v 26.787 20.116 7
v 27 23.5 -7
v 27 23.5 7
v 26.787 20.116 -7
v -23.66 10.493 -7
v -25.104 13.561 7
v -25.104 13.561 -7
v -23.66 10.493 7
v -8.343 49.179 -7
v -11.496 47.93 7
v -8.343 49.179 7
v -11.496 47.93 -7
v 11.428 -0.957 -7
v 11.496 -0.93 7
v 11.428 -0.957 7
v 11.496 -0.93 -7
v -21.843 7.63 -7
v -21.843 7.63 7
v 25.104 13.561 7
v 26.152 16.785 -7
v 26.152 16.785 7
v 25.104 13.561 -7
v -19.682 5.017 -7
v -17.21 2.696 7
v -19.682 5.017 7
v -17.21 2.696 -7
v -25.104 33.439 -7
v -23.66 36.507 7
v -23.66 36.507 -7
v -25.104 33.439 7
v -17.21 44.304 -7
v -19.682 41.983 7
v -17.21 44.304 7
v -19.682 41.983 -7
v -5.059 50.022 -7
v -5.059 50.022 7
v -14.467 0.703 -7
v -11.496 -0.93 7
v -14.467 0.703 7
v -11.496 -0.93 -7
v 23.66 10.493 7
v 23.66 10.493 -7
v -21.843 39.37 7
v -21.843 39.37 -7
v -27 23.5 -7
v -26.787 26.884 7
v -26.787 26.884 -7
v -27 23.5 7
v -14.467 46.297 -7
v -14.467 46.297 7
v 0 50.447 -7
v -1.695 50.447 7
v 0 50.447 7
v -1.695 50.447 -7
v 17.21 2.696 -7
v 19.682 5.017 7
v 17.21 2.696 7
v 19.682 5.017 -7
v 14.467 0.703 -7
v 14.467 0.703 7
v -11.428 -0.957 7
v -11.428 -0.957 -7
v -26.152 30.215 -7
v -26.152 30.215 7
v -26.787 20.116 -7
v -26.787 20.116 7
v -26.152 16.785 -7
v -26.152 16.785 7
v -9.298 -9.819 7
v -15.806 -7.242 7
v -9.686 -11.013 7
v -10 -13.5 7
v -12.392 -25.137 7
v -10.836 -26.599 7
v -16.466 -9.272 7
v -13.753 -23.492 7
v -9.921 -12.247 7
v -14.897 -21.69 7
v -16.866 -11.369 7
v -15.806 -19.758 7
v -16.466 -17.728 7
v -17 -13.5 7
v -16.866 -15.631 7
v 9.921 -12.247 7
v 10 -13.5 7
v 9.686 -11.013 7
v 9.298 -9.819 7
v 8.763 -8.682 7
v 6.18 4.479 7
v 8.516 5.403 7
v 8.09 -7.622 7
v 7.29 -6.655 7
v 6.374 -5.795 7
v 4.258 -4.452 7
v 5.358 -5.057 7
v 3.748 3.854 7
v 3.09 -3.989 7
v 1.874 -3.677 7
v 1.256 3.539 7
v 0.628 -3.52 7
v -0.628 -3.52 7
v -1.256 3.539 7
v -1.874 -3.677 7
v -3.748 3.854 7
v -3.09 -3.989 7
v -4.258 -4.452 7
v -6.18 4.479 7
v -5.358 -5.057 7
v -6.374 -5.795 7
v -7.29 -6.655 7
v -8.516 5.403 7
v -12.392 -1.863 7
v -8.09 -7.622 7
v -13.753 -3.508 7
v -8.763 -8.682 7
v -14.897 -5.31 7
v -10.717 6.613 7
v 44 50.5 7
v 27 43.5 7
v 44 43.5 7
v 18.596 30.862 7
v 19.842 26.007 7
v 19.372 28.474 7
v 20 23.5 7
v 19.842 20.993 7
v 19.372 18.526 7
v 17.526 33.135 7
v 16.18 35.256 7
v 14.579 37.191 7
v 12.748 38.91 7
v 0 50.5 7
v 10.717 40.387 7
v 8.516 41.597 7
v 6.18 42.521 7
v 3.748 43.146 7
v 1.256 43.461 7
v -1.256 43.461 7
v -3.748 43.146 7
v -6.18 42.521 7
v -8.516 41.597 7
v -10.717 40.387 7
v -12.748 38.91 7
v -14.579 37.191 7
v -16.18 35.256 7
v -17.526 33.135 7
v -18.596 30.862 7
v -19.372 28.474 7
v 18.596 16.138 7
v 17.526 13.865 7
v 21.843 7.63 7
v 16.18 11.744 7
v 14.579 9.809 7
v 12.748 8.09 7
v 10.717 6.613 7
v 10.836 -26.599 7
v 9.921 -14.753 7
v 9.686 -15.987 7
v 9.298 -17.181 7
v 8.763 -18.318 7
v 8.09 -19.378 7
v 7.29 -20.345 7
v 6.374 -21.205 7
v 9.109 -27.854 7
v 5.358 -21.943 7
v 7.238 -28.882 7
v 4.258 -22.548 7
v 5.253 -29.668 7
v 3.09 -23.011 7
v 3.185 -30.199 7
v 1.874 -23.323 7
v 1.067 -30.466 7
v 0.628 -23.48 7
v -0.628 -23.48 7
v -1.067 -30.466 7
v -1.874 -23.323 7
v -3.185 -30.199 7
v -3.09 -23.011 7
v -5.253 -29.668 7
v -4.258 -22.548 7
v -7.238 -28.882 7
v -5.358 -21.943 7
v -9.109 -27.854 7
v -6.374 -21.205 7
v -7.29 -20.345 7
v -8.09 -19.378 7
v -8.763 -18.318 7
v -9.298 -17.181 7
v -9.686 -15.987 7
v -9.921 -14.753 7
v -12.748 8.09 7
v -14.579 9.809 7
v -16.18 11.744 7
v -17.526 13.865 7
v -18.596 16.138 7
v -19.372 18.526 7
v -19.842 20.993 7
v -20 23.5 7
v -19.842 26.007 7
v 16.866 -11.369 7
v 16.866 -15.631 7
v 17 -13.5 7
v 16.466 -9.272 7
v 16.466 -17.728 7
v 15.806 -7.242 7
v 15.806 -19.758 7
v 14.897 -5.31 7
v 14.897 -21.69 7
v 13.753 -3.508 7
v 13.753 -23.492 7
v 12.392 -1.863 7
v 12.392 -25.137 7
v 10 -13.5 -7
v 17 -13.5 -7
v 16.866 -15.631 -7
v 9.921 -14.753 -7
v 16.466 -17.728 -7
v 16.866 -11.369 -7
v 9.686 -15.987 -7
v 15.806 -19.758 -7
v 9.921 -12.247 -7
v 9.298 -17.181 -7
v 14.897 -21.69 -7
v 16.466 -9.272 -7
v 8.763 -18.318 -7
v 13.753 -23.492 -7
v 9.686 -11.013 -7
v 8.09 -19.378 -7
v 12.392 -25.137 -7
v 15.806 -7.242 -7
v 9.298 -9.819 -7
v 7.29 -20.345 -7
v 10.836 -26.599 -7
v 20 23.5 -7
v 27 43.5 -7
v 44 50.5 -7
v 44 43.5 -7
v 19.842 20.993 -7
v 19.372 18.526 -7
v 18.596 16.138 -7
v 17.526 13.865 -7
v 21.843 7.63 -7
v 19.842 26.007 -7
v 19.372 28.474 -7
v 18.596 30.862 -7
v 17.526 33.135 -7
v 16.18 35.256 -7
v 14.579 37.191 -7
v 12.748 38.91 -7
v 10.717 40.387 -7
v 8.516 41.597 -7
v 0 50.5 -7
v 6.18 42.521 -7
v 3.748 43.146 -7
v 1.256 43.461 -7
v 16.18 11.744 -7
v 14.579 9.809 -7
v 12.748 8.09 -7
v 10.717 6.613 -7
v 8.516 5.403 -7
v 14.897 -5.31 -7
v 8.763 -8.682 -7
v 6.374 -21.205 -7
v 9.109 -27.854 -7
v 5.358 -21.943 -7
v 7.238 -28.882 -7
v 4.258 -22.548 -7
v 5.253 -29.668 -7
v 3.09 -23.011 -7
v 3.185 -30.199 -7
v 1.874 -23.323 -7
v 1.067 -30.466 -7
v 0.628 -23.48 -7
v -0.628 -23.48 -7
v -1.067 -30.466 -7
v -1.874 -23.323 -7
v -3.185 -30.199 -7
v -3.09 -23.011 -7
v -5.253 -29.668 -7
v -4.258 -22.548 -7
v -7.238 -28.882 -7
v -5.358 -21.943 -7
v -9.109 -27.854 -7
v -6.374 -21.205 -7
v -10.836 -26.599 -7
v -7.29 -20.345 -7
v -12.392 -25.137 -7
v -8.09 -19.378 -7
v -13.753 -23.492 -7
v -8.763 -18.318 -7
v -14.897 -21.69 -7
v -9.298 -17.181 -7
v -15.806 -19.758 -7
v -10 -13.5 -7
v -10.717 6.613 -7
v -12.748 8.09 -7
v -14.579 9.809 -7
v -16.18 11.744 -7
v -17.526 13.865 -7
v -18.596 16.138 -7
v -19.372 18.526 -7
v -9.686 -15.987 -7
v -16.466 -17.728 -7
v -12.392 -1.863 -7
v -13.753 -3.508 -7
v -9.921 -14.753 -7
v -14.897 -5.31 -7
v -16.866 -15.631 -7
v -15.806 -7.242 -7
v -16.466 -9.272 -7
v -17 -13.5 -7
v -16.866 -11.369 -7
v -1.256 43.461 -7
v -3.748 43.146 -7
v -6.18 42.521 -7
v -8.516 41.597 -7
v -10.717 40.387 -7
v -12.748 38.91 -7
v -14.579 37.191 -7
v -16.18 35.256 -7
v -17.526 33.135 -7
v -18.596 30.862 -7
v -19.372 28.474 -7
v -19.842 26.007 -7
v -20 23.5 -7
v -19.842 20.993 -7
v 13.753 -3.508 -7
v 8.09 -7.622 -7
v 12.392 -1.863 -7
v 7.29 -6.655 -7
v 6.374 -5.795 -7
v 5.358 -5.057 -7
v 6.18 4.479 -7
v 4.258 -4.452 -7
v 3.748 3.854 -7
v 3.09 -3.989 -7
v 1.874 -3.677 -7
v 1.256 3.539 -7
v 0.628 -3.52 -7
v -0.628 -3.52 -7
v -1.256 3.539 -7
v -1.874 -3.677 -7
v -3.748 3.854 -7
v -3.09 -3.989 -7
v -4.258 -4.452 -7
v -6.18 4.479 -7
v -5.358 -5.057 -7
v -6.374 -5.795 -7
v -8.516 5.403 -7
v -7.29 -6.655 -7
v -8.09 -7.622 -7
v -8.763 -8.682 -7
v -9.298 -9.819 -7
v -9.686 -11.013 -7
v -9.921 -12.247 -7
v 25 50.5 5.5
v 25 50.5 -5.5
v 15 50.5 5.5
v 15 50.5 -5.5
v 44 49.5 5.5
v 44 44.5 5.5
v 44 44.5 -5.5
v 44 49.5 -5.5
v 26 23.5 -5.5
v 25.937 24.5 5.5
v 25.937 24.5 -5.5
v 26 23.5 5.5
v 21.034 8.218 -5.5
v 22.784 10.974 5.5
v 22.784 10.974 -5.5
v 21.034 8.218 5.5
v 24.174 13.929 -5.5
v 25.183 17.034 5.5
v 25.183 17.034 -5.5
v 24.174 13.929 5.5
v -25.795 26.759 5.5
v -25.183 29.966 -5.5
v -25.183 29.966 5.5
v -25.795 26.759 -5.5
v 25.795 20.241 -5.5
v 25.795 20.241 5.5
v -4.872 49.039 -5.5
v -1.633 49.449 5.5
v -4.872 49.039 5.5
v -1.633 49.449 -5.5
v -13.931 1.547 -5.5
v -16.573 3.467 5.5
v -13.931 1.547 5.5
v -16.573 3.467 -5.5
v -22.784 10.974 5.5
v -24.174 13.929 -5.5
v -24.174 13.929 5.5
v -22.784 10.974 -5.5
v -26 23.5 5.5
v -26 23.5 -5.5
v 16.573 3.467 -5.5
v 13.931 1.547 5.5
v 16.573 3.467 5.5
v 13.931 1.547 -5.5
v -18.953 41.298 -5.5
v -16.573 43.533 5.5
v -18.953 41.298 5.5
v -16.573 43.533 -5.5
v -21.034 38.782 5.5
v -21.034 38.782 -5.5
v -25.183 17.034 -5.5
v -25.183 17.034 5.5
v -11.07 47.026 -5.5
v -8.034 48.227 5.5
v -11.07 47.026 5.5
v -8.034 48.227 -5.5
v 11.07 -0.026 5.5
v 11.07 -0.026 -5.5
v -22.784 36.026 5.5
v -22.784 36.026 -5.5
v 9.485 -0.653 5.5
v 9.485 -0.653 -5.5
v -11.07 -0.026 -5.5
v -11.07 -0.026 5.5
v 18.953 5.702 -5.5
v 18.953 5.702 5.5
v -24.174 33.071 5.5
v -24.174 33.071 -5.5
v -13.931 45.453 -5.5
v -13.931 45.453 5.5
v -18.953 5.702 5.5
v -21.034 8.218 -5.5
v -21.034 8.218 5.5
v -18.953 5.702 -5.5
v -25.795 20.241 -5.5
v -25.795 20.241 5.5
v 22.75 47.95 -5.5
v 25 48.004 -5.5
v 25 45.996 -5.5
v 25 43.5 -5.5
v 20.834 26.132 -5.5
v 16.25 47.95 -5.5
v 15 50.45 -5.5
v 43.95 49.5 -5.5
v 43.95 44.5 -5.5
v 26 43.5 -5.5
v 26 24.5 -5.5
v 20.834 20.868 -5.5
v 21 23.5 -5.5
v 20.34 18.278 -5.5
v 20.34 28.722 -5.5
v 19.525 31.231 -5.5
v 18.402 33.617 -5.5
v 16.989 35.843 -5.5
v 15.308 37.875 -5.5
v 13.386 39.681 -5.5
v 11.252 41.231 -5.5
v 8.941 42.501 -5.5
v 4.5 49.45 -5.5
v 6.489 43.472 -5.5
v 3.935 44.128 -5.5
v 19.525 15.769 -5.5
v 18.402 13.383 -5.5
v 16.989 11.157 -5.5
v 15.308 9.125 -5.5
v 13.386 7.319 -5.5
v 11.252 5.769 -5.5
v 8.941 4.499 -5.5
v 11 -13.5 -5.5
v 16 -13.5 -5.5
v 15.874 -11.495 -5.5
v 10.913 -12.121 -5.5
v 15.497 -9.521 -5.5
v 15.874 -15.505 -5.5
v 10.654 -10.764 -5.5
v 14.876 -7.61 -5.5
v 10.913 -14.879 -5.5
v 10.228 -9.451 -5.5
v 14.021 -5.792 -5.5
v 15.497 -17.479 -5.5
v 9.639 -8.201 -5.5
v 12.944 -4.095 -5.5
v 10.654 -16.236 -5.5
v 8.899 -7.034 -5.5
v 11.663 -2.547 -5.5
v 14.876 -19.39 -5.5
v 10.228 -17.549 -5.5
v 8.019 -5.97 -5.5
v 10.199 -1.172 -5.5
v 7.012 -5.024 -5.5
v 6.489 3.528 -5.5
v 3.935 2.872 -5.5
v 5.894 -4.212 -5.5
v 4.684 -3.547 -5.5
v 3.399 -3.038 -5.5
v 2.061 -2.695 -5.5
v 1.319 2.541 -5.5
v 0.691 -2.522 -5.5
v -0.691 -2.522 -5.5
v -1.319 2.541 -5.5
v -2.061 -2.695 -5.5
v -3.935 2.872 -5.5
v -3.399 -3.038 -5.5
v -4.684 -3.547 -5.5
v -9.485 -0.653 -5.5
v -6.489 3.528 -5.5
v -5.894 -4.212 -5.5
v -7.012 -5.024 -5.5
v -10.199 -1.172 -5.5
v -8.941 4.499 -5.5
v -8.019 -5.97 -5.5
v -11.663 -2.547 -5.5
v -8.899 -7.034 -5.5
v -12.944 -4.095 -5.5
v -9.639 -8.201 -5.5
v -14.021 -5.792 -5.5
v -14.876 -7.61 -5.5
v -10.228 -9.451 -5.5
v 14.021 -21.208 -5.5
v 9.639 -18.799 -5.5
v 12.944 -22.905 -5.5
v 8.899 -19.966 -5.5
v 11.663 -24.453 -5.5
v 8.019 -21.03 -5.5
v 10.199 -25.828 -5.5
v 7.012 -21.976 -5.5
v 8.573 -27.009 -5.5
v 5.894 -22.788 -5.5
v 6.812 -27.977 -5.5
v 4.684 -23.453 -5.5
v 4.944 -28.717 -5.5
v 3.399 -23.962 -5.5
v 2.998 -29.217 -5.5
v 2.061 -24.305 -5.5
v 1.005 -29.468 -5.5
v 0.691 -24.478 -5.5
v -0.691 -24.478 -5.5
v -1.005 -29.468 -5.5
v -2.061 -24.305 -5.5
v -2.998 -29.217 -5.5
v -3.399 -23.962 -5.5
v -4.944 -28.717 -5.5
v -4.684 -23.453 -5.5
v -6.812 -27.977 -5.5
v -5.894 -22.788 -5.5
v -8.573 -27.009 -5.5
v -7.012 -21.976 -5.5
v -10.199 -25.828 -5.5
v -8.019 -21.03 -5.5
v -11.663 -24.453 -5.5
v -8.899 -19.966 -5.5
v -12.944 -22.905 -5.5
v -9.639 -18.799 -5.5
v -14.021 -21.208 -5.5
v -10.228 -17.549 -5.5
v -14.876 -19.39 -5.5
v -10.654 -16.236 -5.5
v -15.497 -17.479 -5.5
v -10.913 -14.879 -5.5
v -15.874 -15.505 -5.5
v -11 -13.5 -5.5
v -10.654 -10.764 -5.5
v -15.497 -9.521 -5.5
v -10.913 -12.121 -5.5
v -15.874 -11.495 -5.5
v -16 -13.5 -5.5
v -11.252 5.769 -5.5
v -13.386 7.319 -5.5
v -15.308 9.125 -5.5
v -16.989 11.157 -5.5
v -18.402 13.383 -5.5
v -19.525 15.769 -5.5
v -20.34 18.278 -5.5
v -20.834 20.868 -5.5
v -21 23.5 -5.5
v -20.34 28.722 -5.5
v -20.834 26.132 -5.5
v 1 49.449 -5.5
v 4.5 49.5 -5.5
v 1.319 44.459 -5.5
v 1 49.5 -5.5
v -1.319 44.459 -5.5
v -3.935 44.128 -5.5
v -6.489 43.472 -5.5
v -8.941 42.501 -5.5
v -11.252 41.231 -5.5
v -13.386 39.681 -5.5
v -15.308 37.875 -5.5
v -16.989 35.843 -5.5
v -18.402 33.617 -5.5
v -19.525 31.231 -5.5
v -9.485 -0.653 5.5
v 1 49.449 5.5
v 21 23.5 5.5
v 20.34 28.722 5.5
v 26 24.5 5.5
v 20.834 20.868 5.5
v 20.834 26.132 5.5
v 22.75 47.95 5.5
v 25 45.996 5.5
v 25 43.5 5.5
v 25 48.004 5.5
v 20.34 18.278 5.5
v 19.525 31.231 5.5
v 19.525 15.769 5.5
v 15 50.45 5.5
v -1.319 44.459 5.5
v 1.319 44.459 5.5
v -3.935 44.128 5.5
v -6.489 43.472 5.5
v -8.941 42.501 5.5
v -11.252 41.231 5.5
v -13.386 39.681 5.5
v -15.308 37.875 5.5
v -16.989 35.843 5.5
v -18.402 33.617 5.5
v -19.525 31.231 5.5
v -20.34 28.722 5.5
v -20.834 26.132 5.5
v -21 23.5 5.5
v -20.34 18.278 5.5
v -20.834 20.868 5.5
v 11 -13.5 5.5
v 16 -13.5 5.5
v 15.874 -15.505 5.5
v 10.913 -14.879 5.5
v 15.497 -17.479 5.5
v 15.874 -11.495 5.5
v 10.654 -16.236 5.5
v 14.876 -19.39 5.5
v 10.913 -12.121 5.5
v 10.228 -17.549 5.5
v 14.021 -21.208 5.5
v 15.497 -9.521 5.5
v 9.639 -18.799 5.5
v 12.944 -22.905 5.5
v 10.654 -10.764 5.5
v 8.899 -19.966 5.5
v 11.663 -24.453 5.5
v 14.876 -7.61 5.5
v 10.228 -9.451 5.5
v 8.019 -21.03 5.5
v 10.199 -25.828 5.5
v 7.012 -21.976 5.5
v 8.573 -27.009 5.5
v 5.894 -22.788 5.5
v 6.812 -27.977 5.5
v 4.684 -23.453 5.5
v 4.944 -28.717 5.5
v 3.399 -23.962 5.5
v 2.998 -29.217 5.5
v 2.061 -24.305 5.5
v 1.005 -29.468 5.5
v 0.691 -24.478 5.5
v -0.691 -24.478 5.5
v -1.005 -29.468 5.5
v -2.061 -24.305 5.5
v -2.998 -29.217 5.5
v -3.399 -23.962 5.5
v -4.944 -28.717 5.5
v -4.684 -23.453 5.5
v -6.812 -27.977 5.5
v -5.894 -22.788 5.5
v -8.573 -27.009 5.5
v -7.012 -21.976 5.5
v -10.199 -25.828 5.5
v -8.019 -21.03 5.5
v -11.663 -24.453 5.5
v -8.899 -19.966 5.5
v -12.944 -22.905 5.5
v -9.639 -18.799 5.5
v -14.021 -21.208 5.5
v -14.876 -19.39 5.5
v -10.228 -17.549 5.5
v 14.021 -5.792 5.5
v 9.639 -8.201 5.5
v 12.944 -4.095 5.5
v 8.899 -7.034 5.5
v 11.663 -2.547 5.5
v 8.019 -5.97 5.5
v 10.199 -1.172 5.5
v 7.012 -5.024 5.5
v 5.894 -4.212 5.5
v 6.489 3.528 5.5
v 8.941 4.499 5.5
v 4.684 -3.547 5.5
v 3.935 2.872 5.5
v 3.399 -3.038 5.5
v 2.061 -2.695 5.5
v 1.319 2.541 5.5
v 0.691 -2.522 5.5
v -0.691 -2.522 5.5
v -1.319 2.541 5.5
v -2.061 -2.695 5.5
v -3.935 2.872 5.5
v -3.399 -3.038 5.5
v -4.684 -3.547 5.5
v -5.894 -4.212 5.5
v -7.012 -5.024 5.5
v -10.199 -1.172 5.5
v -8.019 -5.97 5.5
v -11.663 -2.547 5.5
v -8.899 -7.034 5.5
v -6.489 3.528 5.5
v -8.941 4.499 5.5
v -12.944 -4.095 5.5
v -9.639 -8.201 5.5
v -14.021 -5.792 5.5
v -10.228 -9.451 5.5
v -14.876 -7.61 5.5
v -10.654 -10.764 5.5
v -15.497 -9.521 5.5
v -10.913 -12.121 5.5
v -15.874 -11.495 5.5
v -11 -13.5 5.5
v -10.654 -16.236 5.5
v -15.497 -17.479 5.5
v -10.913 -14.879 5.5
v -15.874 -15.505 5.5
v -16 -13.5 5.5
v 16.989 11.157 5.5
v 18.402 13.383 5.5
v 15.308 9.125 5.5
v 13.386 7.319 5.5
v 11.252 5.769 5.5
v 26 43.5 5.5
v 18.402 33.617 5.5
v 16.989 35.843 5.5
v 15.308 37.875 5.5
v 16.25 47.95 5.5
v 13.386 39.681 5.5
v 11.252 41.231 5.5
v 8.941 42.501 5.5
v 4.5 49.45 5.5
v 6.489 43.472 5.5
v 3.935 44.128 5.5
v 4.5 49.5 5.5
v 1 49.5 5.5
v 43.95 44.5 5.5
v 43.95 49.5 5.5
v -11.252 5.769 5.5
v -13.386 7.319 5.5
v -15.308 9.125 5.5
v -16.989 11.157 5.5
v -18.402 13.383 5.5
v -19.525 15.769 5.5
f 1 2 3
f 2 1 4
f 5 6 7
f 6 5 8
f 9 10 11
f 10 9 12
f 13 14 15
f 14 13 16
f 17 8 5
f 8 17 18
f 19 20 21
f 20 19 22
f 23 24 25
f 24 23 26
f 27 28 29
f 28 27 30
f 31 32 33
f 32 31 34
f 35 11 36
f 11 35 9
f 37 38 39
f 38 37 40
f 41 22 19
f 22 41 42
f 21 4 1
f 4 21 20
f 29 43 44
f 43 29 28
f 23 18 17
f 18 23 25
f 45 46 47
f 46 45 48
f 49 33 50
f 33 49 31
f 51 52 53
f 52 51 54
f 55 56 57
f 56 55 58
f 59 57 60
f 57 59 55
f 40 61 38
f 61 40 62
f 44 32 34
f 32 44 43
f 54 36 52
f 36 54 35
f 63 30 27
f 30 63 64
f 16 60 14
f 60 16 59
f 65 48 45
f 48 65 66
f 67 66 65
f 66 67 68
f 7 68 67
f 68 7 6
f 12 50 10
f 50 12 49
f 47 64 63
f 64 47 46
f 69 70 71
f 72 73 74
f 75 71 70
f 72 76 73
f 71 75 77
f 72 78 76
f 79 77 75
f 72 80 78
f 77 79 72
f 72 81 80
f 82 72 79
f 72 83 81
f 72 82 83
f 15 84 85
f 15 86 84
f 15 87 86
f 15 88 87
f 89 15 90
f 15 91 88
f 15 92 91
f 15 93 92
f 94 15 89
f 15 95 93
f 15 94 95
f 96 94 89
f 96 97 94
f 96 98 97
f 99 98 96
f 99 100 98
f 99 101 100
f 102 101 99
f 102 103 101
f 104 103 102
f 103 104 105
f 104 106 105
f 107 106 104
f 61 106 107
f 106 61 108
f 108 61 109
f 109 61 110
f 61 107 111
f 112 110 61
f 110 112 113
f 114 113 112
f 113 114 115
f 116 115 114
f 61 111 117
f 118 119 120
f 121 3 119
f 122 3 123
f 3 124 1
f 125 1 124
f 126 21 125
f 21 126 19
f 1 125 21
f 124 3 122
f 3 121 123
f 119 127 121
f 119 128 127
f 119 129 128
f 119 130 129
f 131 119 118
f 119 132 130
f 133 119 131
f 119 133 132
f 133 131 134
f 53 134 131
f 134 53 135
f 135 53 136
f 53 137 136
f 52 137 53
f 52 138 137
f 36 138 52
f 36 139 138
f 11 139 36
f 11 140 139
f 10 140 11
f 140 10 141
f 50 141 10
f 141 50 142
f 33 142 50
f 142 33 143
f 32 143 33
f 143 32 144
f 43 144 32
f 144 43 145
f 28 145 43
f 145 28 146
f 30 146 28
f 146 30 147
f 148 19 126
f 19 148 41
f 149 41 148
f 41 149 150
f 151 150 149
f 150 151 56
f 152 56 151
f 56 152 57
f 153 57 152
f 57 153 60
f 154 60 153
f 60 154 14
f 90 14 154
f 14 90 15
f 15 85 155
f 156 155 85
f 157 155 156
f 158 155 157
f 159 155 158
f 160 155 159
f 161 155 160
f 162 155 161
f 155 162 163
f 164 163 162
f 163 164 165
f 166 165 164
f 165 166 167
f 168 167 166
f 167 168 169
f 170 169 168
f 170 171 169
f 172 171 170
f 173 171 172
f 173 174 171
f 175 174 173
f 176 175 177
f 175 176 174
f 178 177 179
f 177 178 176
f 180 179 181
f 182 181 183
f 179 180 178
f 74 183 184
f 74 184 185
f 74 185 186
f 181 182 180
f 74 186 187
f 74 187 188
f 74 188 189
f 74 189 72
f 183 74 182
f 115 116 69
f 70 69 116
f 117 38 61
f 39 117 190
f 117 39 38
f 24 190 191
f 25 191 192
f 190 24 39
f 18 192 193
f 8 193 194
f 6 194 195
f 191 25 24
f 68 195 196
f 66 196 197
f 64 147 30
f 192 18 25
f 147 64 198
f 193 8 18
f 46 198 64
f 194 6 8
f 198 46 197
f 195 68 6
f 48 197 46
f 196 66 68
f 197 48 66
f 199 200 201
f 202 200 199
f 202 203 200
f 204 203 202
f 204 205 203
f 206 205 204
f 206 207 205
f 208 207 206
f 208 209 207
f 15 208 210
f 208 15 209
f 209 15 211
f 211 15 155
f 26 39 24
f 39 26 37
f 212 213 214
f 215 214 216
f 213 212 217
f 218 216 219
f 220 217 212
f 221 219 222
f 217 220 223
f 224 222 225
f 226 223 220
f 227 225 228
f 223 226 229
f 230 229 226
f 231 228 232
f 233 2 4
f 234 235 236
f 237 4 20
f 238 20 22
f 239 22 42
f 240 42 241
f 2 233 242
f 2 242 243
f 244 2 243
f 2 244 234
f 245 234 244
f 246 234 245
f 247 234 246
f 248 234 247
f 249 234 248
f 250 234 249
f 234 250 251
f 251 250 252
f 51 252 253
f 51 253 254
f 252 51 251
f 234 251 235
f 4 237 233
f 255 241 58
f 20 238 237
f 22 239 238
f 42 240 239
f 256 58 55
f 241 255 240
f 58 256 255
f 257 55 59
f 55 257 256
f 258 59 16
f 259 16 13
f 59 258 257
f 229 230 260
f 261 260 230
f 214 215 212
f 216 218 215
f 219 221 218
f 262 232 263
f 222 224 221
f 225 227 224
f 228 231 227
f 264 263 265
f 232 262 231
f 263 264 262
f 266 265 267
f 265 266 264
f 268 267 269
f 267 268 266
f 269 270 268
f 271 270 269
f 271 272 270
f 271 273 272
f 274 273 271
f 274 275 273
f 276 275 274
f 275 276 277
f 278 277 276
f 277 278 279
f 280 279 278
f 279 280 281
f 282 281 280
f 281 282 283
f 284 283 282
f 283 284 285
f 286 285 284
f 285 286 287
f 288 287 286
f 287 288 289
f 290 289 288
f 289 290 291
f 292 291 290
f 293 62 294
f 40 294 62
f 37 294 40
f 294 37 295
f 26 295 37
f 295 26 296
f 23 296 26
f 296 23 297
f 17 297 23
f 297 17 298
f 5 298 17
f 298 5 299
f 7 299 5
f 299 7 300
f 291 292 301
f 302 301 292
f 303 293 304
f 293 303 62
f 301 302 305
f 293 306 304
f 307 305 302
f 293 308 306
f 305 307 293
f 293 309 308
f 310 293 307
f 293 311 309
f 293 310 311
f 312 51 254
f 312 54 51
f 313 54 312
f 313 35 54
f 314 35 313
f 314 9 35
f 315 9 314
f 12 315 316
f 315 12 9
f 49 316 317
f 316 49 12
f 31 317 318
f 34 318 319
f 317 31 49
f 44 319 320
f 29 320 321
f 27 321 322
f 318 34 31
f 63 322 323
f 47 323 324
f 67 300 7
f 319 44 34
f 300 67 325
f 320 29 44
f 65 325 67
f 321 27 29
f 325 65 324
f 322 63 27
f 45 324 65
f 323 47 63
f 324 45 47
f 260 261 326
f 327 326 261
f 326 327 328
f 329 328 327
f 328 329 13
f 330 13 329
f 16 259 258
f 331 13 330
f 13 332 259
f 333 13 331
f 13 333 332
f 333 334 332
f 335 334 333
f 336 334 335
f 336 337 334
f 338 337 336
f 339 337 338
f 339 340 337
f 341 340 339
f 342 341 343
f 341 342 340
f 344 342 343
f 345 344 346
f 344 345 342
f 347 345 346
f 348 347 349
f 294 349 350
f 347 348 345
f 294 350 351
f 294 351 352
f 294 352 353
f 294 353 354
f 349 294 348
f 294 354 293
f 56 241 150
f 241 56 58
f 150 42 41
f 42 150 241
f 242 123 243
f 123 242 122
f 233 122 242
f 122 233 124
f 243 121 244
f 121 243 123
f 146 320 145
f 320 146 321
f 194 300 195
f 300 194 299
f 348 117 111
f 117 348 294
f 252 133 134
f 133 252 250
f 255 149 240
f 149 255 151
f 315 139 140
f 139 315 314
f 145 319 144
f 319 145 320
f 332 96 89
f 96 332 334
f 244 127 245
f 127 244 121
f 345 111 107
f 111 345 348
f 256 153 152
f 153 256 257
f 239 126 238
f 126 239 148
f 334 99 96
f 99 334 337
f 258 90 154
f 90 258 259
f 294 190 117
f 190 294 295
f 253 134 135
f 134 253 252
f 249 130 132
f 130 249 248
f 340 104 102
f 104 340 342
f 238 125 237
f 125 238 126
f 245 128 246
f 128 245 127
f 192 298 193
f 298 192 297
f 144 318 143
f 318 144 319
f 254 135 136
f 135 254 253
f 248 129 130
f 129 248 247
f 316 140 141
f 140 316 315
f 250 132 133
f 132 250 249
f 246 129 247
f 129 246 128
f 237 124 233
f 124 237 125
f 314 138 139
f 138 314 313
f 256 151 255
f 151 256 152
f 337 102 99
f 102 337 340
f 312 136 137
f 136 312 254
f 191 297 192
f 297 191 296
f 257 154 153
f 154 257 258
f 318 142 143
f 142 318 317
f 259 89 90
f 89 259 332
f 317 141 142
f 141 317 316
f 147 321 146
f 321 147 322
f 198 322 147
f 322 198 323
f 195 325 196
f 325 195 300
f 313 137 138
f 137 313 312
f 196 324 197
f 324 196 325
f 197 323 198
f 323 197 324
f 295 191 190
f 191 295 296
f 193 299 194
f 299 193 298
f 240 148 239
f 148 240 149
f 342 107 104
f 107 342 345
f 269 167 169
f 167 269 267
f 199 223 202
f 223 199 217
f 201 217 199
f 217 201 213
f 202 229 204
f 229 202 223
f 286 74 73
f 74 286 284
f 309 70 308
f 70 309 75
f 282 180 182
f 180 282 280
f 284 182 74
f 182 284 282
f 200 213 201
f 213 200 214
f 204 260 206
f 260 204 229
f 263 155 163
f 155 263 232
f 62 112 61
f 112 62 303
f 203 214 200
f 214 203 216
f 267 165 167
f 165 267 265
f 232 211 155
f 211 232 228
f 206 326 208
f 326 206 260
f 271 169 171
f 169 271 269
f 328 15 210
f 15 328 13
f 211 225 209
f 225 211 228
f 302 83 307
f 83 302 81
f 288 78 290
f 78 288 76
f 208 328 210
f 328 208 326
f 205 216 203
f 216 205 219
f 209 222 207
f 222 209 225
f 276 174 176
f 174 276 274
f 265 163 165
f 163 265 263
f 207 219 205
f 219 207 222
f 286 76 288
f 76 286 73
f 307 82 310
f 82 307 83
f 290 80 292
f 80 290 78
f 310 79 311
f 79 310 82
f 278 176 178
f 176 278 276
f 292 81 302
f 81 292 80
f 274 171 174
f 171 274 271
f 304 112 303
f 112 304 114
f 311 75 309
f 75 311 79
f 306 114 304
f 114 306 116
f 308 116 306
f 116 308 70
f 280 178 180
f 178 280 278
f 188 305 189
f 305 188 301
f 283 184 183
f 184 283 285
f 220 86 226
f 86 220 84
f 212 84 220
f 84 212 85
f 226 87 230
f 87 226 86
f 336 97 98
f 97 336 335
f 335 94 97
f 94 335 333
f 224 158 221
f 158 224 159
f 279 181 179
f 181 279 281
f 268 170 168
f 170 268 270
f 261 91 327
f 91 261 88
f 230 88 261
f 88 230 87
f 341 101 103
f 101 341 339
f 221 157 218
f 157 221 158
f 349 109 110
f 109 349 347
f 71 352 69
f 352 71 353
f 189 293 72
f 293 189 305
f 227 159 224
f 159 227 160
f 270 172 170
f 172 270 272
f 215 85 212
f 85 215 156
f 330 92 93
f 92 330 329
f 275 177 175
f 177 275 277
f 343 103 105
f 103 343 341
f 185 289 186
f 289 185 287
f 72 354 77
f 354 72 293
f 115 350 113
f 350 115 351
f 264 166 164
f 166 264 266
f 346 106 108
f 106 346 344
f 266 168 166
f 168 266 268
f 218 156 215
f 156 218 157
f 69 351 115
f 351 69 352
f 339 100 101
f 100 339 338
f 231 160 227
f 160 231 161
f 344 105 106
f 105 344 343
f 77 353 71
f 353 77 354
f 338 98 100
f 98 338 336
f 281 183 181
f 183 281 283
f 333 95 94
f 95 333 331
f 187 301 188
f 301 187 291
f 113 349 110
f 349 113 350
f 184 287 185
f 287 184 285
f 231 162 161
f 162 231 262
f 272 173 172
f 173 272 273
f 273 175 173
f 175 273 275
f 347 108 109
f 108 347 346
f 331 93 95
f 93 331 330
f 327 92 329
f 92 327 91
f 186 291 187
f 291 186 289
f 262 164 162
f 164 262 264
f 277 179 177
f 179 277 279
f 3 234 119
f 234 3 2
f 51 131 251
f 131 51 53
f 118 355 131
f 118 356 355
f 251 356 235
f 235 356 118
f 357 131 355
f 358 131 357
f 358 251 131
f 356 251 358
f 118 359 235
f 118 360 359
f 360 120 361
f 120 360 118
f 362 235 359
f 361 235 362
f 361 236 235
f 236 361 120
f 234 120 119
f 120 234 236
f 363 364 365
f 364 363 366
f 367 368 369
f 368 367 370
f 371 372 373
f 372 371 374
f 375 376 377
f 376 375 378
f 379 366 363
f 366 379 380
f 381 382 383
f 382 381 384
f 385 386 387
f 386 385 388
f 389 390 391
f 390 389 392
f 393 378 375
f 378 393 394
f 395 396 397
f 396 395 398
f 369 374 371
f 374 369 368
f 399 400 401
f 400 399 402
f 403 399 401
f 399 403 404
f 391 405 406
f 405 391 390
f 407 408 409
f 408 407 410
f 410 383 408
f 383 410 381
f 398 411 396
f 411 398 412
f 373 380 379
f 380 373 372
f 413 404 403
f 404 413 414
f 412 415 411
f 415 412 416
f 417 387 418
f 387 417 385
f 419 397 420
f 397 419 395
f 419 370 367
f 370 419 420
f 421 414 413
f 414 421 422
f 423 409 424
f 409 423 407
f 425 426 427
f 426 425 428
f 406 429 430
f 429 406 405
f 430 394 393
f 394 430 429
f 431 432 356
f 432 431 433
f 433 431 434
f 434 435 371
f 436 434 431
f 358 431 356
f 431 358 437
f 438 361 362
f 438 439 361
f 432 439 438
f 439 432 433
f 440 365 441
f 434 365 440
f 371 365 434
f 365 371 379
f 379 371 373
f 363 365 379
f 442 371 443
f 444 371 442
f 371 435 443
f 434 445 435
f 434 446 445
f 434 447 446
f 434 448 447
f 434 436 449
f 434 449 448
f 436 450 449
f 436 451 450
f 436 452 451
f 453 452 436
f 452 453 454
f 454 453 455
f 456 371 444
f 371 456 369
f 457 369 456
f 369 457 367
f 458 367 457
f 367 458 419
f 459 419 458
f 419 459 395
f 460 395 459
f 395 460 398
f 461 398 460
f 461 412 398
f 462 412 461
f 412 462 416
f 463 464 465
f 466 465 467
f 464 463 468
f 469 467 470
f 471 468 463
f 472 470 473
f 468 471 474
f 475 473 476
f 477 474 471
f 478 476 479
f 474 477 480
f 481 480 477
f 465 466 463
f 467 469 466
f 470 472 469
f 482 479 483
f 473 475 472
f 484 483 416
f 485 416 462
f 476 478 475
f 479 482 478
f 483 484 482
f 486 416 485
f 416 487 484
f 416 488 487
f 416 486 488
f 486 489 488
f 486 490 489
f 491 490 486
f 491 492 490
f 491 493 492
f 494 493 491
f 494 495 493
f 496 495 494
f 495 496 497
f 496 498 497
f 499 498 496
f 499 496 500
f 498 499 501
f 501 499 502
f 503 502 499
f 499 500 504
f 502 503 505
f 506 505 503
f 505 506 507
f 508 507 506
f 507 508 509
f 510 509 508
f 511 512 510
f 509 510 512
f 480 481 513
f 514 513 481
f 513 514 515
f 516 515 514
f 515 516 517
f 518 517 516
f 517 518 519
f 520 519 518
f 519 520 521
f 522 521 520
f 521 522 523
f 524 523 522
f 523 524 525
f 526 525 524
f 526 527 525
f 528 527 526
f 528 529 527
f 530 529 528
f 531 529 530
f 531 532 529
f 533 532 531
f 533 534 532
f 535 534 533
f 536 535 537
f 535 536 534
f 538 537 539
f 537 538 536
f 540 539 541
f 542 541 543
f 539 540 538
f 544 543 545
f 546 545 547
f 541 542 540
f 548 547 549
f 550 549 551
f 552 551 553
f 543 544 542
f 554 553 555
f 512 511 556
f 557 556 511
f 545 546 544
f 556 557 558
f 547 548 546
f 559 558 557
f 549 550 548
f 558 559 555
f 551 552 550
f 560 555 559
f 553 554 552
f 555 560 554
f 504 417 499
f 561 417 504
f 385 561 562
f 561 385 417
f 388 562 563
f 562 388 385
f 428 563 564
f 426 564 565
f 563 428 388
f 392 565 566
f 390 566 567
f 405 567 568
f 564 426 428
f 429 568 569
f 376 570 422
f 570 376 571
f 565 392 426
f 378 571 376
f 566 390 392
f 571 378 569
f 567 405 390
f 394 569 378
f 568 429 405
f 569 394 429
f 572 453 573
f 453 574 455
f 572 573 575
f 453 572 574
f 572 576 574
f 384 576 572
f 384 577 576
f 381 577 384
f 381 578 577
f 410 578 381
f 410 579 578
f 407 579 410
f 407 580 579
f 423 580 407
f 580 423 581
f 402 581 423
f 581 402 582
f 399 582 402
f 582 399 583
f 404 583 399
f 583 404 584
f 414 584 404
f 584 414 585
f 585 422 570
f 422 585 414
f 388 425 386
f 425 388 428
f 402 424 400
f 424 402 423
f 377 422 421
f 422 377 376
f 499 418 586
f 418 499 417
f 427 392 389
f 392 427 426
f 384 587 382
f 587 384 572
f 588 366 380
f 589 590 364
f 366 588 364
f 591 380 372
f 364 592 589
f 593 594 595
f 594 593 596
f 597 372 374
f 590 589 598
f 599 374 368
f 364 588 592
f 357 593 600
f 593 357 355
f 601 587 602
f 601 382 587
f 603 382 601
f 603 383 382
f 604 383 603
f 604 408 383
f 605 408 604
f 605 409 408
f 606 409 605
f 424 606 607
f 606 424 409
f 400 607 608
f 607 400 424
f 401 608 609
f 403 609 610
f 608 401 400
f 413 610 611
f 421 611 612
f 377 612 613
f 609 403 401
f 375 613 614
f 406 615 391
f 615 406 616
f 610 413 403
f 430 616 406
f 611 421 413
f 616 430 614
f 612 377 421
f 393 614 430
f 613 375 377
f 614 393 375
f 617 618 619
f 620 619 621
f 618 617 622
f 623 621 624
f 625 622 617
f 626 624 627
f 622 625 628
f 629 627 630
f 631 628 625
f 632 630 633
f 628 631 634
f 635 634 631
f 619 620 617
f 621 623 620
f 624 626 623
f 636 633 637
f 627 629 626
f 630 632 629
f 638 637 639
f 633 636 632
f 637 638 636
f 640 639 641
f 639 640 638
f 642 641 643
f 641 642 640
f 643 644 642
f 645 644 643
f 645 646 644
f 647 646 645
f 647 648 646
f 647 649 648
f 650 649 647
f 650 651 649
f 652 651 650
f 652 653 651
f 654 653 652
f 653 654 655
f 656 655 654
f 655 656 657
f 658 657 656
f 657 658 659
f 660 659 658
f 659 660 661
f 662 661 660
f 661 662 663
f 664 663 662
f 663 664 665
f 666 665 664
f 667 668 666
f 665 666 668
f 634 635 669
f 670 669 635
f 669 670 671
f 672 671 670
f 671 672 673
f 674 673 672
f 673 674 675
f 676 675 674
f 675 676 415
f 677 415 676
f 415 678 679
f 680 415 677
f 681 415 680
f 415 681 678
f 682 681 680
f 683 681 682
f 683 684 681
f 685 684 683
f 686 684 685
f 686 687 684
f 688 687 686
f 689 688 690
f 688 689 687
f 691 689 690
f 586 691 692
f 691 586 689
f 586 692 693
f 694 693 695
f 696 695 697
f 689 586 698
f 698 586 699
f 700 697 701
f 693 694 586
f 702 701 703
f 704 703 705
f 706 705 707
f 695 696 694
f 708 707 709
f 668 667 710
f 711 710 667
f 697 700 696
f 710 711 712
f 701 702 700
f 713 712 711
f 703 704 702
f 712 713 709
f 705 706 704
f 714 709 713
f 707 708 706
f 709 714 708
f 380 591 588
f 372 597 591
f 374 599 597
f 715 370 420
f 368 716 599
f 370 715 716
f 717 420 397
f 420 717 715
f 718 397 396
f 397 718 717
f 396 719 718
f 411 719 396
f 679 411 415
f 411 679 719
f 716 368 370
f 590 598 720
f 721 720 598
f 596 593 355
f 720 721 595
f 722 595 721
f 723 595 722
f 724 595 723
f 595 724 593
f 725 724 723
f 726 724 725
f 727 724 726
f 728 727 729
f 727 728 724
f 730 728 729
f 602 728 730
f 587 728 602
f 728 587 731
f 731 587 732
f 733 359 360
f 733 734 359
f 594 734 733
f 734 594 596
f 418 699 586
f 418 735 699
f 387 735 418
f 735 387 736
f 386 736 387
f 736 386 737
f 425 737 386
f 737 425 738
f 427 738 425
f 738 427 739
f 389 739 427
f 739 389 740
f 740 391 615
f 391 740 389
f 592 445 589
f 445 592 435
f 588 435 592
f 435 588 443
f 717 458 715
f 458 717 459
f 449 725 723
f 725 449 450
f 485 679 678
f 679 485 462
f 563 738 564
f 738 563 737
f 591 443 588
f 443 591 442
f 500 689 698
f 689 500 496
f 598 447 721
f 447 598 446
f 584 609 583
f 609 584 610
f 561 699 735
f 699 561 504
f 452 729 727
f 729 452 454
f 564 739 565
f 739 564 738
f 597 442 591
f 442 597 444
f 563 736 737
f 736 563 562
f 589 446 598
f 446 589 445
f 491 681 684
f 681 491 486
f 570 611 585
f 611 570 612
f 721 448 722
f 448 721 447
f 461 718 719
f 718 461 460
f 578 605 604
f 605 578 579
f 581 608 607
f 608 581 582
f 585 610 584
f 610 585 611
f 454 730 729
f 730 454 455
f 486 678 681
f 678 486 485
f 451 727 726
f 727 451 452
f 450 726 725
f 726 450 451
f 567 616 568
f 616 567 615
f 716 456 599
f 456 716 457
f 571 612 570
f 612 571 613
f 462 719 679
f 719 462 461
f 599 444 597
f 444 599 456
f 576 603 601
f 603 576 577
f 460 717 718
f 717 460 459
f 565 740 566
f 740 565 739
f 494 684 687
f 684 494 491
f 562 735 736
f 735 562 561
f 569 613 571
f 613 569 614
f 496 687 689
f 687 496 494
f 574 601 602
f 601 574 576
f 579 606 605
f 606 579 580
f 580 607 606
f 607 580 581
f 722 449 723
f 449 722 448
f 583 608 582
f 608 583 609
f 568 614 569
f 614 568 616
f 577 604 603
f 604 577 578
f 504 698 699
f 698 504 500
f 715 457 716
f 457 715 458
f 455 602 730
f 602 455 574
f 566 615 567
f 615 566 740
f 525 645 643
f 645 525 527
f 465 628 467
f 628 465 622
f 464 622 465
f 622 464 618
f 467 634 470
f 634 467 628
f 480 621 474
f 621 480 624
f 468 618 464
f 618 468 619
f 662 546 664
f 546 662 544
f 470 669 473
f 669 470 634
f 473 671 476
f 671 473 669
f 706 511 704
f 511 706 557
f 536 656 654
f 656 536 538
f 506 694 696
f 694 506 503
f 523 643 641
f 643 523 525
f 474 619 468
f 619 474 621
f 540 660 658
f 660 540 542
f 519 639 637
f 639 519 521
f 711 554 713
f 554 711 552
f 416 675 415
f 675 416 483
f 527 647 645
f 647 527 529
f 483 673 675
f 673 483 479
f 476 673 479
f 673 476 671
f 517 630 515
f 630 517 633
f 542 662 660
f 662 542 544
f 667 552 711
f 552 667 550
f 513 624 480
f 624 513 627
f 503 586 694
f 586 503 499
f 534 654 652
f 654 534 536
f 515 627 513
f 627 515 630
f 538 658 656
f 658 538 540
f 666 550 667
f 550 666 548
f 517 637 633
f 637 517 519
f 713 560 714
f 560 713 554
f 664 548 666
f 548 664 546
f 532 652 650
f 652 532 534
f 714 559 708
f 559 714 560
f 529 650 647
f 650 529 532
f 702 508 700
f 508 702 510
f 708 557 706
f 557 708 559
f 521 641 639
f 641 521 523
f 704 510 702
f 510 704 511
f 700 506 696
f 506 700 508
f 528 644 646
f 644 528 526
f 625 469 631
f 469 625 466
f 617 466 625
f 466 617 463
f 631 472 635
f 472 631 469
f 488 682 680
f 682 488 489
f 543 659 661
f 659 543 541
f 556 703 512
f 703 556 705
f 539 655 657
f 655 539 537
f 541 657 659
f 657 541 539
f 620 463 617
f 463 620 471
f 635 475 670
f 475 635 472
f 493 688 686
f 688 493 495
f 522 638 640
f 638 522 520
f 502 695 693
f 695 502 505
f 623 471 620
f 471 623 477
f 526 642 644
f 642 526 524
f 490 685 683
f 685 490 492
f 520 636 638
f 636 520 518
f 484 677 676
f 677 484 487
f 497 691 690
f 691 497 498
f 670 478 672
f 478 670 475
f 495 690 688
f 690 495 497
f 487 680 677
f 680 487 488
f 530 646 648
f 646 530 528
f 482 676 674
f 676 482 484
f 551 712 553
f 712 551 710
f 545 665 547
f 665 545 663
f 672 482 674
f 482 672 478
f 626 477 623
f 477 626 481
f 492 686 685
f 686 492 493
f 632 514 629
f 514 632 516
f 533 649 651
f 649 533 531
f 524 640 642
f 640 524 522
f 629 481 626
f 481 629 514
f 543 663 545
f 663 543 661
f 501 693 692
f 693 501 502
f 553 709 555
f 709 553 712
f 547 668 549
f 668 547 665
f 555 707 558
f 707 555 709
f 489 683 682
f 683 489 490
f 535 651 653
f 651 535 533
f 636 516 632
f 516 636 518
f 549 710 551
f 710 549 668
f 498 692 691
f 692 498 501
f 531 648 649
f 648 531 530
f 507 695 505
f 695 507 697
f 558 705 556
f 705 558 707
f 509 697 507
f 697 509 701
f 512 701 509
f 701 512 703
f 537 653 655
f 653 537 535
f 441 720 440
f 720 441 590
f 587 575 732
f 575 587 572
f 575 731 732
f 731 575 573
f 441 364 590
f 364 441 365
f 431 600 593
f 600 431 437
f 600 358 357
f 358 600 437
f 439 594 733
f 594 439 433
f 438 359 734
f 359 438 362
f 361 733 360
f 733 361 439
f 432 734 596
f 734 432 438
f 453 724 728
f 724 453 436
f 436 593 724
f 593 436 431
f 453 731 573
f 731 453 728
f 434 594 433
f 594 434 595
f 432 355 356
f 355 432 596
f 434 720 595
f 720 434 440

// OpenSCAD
/* Dual Tone Whistle - Customizable */
/* 2014-10-25 Roman Hegglin */

/* [Main Settings] */
//Diameter of the first loop
dia1=54;

//Diameter of the second loop
dia2=34;

//Height
height=14;

/* [Advanced Settings] */

// The mesh resolution

mesh_resolution=50; // [20:120]


$fn=mesh_resolution; 

difference()
{
//translate([0,0,-3])
//body
union(){
//loop 1 near Mouthpiece
translate([0,dia1/2-3.5,0])
difference() {
cylinder(r=dia1/2, h=height,center=true);
cylinder(r=dia1/2-7, h=height+1,center=true);
}
//loop 2
translate([0,-dia2/2+3.5,0])
difference() {
cylinder(r=dia2/2, h=height,center=true);
cylinder(r=dia2/2-7, h=height+1,center=true);
}
//Mouthpiece
difference() {
translate([dia1/4,dia1/4*3-3.5,0])
cube(size = [dia1/2,dia1/2,height], center = true);
translate([0,dia1/2-3.5,0])
cylinder(r=dia1/2-7, h=height+1,center=true);
}

translate([(dia1/2+17)/2,dia1-7,0])
cube(size = [dia1/2+17,7,height], center = true);


}

//cavity
difference() {
union(){
//loop 1 near Mouthpiece
translate([0,dia1/2-3.5,0])
difference() {
cylinder(r=dia1/2-1, h=height-3,center=true);
cylinder(r=dia1/2-7+1, h=height+1-3,center=true);
}
//loop 2
translate([0,-dia2/2+3.5,0])
difference() {
cylinder(r=dia2/2-1, h=height-3,center=true);
cylinder(r=dia2/2-7+1, h=height+1-3,center=true);
}
//Mouthpiece
difference() {
translate([dia1/4,dia1/4*3-3.5,0])
cube(size = [dia1/2-2,dia1/2-2,height-3], center = true);
translate([0,dia1/2-3.5,0])
cylinder(r=dia1/2-7+1, h=height+1,center=true);
}

hole1 ();
hole2 ();

}
add1 ();
add2 ();
}
}

module hole1 () 
{
hull() {//blowcanal
translate([dia1/2+17,dia1-7,0])
cube(size = [0.1,5,height-3], center = true);

translate([dia1/2-2,dia1-7,0])
cube(size = [0.1,2,height-3], center = true);
}
}

module hole2 ()
{
hull() {//whislte hole
translate([dia1/2-7,dia1-3.5,0])
cube(size = [10,0.1,height-3], center = true);
translate([dia1/2-3,dia1-4-2,0])
cube(size = [2.5,0.1,height-3], center = true);
}
translate([dia1/2-3,dia1-5.5,0])
cube(size = [2.5,7-2,height-3], center = true);
}

module add1 ()
{
difference () {
hull() {
translate([dia1/4,dia1-3.5-1,0])
cube(size = [dia1/3,0.1,height-2], center = true);
translate([dia1/2-7,dia1-3.5-2.5,0])
cube(size = [7.5,0.1,height-2], center = true);
}
hole2 ();
}
}

module add2 ()
{
difference () {
translate([dia1/2-1.5,dia1-7,0])
cube(size = [1,7,height-2], center = true);

hole1 ();
}
}

